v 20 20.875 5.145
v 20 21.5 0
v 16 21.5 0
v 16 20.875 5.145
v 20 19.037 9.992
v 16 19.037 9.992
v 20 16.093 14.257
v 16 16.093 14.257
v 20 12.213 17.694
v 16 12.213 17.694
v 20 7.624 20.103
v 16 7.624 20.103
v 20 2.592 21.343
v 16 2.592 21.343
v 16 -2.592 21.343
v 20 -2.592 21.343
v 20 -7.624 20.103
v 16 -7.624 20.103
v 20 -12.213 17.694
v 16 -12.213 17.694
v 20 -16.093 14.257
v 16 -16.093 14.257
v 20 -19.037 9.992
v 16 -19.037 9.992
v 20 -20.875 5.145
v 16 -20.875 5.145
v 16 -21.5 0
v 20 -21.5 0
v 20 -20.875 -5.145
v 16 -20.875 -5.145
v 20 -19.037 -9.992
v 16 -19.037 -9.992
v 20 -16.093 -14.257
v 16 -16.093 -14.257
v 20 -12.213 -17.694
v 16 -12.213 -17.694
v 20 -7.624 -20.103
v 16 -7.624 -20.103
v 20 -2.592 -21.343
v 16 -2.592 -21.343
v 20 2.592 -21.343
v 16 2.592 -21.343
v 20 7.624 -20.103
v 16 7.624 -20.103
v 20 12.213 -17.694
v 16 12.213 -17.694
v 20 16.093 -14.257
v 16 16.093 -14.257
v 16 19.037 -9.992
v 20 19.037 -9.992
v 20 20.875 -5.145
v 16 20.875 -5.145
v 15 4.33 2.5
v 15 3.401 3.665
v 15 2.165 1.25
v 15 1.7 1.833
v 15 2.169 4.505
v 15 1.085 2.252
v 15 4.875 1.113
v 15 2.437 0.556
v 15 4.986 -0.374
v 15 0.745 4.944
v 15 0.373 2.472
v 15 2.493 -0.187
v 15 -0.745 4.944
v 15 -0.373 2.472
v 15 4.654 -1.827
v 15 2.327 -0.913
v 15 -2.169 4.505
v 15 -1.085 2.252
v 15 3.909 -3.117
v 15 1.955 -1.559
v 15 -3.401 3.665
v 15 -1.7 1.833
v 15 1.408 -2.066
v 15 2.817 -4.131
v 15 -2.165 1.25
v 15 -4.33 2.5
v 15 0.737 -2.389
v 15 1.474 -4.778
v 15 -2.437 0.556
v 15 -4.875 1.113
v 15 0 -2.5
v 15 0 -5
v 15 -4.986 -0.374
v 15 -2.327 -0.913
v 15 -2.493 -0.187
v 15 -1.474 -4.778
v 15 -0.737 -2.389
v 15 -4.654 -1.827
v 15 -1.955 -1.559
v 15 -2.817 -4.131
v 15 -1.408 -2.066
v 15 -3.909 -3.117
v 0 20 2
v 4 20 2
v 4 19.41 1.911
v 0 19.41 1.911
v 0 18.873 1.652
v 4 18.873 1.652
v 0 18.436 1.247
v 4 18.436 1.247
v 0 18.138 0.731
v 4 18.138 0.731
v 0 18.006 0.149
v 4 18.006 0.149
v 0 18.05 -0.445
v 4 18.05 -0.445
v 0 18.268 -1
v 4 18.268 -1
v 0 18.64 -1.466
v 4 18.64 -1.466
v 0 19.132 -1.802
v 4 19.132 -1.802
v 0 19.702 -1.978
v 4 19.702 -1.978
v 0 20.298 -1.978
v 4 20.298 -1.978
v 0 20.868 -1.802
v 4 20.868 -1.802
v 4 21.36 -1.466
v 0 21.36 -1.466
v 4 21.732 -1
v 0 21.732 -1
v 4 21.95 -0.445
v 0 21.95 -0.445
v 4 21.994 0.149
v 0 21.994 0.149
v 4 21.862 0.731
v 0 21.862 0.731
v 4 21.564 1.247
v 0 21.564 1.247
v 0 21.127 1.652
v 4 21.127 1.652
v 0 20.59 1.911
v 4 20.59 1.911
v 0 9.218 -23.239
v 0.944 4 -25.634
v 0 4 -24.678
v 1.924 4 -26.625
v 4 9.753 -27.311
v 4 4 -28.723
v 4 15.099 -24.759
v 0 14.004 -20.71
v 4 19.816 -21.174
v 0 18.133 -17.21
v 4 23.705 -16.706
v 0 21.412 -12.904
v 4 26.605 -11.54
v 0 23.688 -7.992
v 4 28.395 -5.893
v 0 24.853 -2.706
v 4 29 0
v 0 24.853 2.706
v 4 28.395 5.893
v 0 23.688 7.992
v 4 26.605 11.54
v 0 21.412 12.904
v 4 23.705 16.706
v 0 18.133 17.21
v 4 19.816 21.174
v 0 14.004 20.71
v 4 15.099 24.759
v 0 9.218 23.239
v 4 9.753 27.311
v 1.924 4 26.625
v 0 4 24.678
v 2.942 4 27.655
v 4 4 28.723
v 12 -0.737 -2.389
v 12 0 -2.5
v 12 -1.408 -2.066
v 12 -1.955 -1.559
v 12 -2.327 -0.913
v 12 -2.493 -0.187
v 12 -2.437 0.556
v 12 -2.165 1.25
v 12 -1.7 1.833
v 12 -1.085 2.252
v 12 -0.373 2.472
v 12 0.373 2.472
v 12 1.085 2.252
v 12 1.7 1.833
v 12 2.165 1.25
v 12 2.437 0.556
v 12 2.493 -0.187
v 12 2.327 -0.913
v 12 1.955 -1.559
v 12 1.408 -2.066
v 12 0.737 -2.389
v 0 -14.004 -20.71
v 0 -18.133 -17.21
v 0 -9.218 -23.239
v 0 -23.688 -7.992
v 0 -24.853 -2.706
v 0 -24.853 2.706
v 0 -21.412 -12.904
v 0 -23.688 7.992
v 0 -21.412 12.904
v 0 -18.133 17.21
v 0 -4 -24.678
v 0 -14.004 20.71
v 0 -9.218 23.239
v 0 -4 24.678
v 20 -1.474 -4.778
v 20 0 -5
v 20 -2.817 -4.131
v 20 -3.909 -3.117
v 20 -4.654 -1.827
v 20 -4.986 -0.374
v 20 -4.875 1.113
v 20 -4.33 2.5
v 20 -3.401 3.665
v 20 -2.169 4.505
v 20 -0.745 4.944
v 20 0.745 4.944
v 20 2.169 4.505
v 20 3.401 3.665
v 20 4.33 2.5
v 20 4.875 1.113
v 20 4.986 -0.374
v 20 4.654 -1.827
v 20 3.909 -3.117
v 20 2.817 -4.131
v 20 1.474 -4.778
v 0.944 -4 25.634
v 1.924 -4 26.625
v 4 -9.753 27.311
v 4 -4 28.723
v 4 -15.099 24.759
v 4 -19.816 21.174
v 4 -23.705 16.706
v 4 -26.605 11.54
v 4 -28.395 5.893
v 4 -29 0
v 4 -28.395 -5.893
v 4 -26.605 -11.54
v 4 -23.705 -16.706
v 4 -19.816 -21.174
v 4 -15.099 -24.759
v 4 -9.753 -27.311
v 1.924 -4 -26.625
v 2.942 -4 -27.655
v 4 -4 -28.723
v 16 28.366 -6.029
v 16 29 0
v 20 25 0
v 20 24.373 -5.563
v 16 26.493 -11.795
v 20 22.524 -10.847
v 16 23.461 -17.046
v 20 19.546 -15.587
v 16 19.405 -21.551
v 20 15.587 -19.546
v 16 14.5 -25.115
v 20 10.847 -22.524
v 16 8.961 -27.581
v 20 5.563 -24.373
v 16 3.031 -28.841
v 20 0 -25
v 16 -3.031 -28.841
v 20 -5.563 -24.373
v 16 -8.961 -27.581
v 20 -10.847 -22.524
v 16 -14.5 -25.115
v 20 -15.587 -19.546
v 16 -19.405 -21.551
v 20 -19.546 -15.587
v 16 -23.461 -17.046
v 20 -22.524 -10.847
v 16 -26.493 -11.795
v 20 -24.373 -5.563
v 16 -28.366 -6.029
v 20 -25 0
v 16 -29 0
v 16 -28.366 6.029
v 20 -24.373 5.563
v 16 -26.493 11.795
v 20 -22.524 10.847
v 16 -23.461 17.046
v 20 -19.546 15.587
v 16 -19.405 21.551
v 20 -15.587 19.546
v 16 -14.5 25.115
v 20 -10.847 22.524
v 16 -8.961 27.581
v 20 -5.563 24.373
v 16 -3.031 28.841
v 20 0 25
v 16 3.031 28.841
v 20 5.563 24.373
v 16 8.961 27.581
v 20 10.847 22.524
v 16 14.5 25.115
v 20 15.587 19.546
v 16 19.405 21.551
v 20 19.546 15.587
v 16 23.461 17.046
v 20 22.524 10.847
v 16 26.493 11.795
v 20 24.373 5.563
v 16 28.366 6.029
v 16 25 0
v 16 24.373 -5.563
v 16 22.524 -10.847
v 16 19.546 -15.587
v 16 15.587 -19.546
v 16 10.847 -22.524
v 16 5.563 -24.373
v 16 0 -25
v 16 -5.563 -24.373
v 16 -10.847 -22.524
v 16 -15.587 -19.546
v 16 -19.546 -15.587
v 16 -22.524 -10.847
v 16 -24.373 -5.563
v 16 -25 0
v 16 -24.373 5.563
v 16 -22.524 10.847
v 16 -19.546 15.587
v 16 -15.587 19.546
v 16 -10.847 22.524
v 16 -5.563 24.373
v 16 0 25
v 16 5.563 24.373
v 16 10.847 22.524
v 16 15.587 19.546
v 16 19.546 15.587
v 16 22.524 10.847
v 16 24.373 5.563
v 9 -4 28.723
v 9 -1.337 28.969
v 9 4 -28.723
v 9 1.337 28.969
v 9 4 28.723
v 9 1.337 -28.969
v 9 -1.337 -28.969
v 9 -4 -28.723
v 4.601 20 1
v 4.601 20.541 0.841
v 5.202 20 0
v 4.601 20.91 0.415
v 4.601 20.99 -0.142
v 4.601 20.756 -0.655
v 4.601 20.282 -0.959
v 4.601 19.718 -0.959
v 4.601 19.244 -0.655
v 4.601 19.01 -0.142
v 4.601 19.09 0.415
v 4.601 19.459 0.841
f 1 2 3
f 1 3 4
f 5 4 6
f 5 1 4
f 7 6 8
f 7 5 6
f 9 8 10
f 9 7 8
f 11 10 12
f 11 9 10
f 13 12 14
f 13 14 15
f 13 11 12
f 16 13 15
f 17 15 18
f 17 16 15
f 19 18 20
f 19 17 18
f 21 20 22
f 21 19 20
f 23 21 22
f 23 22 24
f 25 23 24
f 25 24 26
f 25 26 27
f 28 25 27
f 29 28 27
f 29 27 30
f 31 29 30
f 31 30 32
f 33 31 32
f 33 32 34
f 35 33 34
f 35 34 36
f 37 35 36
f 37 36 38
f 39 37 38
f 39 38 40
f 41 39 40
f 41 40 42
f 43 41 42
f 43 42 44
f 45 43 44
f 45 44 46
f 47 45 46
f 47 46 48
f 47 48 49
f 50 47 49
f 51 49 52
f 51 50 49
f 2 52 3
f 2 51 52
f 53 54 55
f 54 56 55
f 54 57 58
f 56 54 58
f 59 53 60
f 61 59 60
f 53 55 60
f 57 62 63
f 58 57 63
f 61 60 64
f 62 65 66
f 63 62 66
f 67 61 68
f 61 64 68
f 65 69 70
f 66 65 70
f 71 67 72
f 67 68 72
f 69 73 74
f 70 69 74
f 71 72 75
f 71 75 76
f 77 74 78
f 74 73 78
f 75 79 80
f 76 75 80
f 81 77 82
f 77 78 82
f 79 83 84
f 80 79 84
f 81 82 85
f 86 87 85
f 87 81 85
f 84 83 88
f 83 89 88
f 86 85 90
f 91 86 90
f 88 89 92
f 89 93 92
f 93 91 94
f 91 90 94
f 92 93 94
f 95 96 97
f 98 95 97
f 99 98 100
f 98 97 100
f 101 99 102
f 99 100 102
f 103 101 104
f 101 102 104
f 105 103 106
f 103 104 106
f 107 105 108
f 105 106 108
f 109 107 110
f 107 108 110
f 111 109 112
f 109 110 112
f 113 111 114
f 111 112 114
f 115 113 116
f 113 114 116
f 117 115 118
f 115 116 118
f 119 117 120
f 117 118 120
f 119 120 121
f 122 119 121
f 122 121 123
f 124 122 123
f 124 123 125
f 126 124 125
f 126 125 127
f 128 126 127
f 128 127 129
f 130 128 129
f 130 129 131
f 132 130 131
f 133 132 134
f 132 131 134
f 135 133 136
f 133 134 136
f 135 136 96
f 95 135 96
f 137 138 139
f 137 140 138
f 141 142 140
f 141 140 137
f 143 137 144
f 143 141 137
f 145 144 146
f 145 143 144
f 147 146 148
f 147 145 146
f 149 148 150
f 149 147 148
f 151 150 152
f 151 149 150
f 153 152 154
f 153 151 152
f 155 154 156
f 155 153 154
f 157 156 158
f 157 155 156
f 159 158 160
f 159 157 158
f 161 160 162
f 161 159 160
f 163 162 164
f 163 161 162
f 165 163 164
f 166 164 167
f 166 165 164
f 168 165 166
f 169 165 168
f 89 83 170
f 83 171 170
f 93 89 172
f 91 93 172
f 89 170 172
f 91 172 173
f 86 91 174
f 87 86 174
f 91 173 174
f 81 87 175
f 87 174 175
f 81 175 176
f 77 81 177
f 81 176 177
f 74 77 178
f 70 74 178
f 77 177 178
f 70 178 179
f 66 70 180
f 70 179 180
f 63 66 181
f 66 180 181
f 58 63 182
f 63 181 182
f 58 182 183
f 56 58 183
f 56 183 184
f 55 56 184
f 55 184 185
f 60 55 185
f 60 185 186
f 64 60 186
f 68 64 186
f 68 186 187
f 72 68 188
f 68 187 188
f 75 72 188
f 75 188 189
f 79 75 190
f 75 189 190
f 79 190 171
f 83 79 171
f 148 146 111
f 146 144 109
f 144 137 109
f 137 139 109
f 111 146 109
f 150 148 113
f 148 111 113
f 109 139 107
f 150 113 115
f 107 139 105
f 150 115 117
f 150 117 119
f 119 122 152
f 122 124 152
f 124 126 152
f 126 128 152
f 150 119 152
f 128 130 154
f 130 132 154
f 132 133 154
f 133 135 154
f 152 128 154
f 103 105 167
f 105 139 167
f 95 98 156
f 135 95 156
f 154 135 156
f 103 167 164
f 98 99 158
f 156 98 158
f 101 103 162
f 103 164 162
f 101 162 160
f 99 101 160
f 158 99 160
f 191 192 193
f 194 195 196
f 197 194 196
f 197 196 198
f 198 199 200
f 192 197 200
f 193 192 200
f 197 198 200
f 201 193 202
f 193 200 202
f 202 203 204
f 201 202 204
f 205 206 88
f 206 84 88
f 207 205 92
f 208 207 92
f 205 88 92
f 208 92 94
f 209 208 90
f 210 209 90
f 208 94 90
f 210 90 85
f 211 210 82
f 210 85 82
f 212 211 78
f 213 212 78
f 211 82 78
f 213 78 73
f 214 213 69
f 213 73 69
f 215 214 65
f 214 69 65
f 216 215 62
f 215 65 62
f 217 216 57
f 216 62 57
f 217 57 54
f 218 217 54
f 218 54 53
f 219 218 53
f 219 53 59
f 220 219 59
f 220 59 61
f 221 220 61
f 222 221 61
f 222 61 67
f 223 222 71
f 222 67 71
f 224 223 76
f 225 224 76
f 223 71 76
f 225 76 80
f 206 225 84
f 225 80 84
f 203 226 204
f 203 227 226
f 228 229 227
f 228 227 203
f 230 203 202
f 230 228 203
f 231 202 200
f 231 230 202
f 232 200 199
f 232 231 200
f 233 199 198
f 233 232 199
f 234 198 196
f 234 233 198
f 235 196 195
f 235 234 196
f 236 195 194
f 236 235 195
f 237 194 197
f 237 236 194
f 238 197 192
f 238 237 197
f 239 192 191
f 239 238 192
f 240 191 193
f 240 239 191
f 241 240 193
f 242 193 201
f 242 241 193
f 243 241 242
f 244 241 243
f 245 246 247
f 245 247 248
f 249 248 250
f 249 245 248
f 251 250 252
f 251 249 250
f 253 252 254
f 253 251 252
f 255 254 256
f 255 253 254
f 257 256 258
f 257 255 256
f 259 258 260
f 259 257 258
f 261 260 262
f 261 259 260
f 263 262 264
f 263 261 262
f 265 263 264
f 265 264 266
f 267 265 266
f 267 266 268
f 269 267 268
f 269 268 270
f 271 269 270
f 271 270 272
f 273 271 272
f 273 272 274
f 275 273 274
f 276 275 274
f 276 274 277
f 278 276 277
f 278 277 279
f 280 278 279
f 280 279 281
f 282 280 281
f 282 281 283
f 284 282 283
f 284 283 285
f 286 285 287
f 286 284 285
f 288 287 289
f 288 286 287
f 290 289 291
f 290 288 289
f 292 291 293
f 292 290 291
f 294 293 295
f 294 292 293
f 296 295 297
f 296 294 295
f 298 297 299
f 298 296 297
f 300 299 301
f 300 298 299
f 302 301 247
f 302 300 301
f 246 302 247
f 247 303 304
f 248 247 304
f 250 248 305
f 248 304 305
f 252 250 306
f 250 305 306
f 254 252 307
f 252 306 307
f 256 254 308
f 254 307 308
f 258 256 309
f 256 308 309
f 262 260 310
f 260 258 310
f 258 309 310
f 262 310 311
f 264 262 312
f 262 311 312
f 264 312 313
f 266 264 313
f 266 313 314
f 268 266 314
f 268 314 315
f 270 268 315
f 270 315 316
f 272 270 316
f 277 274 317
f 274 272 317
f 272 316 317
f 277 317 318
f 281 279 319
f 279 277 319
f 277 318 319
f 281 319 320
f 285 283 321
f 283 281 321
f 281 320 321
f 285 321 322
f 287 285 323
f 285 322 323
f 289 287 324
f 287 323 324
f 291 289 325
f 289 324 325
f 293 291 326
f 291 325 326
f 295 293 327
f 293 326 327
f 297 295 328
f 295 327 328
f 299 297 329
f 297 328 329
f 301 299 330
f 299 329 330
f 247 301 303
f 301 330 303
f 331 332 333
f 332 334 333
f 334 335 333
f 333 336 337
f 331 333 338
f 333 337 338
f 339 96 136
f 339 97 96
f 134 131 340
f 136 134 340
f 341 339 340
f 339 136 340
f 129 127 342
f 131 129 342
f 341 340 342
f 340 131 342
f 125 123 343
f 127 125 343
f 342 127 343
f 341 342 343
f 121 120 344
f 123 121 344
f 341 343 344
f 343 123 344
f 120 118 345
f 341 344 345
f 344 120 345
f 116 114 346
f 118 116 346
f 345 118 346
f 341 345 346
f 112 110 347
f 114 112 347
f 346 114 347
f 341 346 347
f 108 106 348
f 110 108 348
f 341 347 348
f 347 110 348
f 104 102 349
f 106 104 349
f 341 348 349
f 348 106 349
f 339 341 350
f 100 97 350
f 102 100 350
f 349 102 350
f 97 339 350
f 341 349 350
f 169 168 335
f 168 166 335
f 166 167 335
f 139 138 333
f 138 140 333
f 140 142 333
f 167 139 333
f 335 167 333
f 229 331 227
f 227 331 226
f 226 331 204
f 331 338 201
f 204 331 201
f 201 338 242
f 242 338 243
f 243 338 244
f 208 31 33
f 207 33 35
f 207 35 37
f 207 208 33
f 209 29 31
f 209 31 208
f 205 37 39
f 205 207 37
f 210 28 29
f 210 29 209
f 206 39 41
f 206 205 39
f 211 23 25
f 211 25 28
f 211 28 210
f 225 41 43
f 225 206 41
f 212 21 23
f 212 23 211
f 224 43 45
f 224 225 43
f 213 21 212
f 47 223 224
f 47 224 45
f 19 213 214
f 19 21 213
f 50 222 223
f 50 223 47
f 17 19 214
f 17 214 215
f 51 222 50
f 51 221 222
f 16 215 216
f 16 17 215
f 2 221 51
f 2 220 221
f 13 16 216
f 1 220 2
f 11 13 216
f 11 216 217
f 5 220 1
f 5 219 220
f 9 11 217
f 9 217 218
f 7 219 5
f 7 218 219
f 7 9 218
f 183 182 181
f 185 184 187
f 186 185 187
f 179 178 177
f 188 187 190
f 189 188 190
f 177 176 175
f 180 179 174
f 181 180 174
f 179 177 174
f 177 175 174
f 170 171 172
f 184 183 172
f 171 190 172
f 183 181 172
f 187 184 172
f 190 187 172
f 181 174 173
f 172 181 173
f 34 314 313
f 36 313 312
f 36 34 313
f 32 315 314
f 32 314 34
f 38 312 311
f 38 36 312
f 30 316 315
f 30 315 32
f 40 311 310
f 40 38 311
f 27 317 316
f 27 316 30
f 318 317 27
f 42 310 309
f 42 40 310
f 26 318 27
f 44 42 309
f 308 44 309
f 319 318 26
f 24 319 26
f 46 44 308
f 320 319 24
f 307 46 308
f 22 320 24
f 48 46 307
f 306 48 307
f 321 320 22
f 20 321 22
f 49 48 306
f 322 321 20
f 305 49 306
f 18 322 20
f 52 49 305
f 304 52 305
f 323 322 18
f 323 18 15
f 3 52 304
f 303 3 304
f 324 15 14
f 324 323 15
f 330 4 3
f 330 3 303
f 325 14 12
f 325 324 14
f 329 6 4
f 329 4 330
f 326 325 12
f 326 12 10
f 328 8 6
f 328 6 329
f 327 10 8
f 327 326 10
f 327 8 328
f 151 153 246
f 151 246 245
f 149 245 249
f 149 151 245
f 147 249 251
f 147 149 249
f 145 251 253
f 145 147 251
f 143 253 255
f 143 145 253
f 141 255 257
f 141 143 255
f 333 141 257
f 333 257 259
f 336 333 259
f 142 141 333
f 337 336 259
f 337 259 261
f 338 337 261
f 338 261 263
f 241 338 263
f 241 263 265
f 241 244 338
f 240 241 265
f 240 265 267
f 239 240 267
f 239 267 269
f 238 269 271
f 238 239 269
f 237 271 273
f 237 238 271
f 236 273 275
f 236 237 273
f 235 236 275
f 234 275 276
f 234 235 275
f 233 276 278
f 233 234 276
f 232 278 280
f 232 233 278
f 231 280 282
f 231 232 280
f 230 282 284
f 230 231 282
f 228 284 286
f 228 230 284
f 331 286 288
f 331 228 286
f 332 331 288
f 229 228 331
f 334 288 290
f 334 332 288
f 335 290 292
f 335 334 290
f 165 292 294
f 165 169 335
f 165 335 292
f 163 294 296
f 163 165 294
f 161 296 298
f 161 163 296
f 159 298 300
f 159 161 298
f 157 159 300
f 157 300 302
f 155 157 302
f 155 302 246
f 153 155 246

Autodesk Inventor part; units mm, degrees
ref_plane "YZ Plane" through (0, 0, 0) normal (1, 0, 0) x (0, 1, 0)
ref_plane "XZ Plane" through (0, 0, 0) normal (0, 1, 0) x (-1, 0, 0)
ref_plane "XY Plane" through (0, 0, 0) normal (0, 0, 1) x (1, 0, 0)
sketch "Эскиз5" plane through (0, 0, 0) normal (0, 0, 1) x (1, 0, 0)
  line L0 (0, 0) -> (20, 0)
  line L1 (20, 0) -> (20, 25)
  line L2 (16, 29) -> (4, 29)
  line L3 (0, 25) -> (0, 0)
  line L4 (4, 29) -> (0, 25)
  line L5 (16, 29) -> (20, 25)
  point P0 (20, 29)
  point P1 (0, 29)
  dimension "d25" = 20
  dimension "d26" = 29
  dimension "d27" = 4
  dimension "d28" = 4
  dimension "d29" = 4
  dimension "d30" = 4
revolve "Вращение3" add sketch "Эскиз5" angle 360 about axis through (0, 0, 0) along (1, 0, 0)
sketch "Эскиз6" plane through (20, 0, 0) normal (1, 0, 0) x (0, 0, -1)
  point P0 (0, 0)
  point P1 (0, 0)
hole "Отверстие2" at (20, 0, 0) direction (-1, 0, 0) diameter 10 depth 5
sketch "Эскиз7" plane through (15, 0, 0) normal (1, 0, 0) x (0, 0, -1)
  point P0 (0, 0)
  point P1 (0, 0)
hole "Отверстие3" at (15, 0, 0) direction (-1, 0, 0) diameter 5 depth 3
sketch "Эскиз8" plane through (0, 0, 0) normal (0, 0, 1) x (1, 0, 0)
  line L0 (20, -25) -> (20, 25) construction
  line L1 (20, 25) -> (16, 25)
  line L2 (16, 25) -> (16, 21.5)
  line L3 (16, 21.5) -> (20, 21.5)
  line L4 (20, 21.5) -> (20, 25)
  line L5 (0, 0) -> (20, 0)
  dimension "d46" = 4
  dimension "d47" = 3.5
revolve "Вращение4" cut sketch "Эскиз8" angle 360 about axis through (0, 0, 0) along (1, 0, 0)
sketch "Эскиз9" plane through (0, 0, 0) normal (0, 0, 1) x (1, 0, 0)
  line L0 (0, -25) -> (0, 25) construction
  line L1 (0, 4) -> (9, 4)
  line L2 (9, 4) -> (9, -4)
  line L3 (9, -4) -> (0, -4)
  line L4 (0, -4) -> (0, 4)
  point P0 (0, 0)
  point P1 (0, 0)
  point P2 (0, 0)
  dimension "d49" = 9
  dimension "d50" = 8
extrude "Выдавливание2" cut sketch "Эскиз9" along normal through all both and the other way through all
sketch "Эскиз10" plane through (0, 0, 0) normal (-1, 0, 0) x (0, 0, 1)
  line L0 (0, 0) -> (0, 20) construction
  dimension "d53" = 20
hole "Отверстие4" at (0, 20, 0) direction (1, 0, 0) diameter 4 depth 4 tip angle 118
equation "\"d28\" = d27"
equation "\"d29\" = d27"
equation "\"d30\" = d29"
properties part number "711128"
